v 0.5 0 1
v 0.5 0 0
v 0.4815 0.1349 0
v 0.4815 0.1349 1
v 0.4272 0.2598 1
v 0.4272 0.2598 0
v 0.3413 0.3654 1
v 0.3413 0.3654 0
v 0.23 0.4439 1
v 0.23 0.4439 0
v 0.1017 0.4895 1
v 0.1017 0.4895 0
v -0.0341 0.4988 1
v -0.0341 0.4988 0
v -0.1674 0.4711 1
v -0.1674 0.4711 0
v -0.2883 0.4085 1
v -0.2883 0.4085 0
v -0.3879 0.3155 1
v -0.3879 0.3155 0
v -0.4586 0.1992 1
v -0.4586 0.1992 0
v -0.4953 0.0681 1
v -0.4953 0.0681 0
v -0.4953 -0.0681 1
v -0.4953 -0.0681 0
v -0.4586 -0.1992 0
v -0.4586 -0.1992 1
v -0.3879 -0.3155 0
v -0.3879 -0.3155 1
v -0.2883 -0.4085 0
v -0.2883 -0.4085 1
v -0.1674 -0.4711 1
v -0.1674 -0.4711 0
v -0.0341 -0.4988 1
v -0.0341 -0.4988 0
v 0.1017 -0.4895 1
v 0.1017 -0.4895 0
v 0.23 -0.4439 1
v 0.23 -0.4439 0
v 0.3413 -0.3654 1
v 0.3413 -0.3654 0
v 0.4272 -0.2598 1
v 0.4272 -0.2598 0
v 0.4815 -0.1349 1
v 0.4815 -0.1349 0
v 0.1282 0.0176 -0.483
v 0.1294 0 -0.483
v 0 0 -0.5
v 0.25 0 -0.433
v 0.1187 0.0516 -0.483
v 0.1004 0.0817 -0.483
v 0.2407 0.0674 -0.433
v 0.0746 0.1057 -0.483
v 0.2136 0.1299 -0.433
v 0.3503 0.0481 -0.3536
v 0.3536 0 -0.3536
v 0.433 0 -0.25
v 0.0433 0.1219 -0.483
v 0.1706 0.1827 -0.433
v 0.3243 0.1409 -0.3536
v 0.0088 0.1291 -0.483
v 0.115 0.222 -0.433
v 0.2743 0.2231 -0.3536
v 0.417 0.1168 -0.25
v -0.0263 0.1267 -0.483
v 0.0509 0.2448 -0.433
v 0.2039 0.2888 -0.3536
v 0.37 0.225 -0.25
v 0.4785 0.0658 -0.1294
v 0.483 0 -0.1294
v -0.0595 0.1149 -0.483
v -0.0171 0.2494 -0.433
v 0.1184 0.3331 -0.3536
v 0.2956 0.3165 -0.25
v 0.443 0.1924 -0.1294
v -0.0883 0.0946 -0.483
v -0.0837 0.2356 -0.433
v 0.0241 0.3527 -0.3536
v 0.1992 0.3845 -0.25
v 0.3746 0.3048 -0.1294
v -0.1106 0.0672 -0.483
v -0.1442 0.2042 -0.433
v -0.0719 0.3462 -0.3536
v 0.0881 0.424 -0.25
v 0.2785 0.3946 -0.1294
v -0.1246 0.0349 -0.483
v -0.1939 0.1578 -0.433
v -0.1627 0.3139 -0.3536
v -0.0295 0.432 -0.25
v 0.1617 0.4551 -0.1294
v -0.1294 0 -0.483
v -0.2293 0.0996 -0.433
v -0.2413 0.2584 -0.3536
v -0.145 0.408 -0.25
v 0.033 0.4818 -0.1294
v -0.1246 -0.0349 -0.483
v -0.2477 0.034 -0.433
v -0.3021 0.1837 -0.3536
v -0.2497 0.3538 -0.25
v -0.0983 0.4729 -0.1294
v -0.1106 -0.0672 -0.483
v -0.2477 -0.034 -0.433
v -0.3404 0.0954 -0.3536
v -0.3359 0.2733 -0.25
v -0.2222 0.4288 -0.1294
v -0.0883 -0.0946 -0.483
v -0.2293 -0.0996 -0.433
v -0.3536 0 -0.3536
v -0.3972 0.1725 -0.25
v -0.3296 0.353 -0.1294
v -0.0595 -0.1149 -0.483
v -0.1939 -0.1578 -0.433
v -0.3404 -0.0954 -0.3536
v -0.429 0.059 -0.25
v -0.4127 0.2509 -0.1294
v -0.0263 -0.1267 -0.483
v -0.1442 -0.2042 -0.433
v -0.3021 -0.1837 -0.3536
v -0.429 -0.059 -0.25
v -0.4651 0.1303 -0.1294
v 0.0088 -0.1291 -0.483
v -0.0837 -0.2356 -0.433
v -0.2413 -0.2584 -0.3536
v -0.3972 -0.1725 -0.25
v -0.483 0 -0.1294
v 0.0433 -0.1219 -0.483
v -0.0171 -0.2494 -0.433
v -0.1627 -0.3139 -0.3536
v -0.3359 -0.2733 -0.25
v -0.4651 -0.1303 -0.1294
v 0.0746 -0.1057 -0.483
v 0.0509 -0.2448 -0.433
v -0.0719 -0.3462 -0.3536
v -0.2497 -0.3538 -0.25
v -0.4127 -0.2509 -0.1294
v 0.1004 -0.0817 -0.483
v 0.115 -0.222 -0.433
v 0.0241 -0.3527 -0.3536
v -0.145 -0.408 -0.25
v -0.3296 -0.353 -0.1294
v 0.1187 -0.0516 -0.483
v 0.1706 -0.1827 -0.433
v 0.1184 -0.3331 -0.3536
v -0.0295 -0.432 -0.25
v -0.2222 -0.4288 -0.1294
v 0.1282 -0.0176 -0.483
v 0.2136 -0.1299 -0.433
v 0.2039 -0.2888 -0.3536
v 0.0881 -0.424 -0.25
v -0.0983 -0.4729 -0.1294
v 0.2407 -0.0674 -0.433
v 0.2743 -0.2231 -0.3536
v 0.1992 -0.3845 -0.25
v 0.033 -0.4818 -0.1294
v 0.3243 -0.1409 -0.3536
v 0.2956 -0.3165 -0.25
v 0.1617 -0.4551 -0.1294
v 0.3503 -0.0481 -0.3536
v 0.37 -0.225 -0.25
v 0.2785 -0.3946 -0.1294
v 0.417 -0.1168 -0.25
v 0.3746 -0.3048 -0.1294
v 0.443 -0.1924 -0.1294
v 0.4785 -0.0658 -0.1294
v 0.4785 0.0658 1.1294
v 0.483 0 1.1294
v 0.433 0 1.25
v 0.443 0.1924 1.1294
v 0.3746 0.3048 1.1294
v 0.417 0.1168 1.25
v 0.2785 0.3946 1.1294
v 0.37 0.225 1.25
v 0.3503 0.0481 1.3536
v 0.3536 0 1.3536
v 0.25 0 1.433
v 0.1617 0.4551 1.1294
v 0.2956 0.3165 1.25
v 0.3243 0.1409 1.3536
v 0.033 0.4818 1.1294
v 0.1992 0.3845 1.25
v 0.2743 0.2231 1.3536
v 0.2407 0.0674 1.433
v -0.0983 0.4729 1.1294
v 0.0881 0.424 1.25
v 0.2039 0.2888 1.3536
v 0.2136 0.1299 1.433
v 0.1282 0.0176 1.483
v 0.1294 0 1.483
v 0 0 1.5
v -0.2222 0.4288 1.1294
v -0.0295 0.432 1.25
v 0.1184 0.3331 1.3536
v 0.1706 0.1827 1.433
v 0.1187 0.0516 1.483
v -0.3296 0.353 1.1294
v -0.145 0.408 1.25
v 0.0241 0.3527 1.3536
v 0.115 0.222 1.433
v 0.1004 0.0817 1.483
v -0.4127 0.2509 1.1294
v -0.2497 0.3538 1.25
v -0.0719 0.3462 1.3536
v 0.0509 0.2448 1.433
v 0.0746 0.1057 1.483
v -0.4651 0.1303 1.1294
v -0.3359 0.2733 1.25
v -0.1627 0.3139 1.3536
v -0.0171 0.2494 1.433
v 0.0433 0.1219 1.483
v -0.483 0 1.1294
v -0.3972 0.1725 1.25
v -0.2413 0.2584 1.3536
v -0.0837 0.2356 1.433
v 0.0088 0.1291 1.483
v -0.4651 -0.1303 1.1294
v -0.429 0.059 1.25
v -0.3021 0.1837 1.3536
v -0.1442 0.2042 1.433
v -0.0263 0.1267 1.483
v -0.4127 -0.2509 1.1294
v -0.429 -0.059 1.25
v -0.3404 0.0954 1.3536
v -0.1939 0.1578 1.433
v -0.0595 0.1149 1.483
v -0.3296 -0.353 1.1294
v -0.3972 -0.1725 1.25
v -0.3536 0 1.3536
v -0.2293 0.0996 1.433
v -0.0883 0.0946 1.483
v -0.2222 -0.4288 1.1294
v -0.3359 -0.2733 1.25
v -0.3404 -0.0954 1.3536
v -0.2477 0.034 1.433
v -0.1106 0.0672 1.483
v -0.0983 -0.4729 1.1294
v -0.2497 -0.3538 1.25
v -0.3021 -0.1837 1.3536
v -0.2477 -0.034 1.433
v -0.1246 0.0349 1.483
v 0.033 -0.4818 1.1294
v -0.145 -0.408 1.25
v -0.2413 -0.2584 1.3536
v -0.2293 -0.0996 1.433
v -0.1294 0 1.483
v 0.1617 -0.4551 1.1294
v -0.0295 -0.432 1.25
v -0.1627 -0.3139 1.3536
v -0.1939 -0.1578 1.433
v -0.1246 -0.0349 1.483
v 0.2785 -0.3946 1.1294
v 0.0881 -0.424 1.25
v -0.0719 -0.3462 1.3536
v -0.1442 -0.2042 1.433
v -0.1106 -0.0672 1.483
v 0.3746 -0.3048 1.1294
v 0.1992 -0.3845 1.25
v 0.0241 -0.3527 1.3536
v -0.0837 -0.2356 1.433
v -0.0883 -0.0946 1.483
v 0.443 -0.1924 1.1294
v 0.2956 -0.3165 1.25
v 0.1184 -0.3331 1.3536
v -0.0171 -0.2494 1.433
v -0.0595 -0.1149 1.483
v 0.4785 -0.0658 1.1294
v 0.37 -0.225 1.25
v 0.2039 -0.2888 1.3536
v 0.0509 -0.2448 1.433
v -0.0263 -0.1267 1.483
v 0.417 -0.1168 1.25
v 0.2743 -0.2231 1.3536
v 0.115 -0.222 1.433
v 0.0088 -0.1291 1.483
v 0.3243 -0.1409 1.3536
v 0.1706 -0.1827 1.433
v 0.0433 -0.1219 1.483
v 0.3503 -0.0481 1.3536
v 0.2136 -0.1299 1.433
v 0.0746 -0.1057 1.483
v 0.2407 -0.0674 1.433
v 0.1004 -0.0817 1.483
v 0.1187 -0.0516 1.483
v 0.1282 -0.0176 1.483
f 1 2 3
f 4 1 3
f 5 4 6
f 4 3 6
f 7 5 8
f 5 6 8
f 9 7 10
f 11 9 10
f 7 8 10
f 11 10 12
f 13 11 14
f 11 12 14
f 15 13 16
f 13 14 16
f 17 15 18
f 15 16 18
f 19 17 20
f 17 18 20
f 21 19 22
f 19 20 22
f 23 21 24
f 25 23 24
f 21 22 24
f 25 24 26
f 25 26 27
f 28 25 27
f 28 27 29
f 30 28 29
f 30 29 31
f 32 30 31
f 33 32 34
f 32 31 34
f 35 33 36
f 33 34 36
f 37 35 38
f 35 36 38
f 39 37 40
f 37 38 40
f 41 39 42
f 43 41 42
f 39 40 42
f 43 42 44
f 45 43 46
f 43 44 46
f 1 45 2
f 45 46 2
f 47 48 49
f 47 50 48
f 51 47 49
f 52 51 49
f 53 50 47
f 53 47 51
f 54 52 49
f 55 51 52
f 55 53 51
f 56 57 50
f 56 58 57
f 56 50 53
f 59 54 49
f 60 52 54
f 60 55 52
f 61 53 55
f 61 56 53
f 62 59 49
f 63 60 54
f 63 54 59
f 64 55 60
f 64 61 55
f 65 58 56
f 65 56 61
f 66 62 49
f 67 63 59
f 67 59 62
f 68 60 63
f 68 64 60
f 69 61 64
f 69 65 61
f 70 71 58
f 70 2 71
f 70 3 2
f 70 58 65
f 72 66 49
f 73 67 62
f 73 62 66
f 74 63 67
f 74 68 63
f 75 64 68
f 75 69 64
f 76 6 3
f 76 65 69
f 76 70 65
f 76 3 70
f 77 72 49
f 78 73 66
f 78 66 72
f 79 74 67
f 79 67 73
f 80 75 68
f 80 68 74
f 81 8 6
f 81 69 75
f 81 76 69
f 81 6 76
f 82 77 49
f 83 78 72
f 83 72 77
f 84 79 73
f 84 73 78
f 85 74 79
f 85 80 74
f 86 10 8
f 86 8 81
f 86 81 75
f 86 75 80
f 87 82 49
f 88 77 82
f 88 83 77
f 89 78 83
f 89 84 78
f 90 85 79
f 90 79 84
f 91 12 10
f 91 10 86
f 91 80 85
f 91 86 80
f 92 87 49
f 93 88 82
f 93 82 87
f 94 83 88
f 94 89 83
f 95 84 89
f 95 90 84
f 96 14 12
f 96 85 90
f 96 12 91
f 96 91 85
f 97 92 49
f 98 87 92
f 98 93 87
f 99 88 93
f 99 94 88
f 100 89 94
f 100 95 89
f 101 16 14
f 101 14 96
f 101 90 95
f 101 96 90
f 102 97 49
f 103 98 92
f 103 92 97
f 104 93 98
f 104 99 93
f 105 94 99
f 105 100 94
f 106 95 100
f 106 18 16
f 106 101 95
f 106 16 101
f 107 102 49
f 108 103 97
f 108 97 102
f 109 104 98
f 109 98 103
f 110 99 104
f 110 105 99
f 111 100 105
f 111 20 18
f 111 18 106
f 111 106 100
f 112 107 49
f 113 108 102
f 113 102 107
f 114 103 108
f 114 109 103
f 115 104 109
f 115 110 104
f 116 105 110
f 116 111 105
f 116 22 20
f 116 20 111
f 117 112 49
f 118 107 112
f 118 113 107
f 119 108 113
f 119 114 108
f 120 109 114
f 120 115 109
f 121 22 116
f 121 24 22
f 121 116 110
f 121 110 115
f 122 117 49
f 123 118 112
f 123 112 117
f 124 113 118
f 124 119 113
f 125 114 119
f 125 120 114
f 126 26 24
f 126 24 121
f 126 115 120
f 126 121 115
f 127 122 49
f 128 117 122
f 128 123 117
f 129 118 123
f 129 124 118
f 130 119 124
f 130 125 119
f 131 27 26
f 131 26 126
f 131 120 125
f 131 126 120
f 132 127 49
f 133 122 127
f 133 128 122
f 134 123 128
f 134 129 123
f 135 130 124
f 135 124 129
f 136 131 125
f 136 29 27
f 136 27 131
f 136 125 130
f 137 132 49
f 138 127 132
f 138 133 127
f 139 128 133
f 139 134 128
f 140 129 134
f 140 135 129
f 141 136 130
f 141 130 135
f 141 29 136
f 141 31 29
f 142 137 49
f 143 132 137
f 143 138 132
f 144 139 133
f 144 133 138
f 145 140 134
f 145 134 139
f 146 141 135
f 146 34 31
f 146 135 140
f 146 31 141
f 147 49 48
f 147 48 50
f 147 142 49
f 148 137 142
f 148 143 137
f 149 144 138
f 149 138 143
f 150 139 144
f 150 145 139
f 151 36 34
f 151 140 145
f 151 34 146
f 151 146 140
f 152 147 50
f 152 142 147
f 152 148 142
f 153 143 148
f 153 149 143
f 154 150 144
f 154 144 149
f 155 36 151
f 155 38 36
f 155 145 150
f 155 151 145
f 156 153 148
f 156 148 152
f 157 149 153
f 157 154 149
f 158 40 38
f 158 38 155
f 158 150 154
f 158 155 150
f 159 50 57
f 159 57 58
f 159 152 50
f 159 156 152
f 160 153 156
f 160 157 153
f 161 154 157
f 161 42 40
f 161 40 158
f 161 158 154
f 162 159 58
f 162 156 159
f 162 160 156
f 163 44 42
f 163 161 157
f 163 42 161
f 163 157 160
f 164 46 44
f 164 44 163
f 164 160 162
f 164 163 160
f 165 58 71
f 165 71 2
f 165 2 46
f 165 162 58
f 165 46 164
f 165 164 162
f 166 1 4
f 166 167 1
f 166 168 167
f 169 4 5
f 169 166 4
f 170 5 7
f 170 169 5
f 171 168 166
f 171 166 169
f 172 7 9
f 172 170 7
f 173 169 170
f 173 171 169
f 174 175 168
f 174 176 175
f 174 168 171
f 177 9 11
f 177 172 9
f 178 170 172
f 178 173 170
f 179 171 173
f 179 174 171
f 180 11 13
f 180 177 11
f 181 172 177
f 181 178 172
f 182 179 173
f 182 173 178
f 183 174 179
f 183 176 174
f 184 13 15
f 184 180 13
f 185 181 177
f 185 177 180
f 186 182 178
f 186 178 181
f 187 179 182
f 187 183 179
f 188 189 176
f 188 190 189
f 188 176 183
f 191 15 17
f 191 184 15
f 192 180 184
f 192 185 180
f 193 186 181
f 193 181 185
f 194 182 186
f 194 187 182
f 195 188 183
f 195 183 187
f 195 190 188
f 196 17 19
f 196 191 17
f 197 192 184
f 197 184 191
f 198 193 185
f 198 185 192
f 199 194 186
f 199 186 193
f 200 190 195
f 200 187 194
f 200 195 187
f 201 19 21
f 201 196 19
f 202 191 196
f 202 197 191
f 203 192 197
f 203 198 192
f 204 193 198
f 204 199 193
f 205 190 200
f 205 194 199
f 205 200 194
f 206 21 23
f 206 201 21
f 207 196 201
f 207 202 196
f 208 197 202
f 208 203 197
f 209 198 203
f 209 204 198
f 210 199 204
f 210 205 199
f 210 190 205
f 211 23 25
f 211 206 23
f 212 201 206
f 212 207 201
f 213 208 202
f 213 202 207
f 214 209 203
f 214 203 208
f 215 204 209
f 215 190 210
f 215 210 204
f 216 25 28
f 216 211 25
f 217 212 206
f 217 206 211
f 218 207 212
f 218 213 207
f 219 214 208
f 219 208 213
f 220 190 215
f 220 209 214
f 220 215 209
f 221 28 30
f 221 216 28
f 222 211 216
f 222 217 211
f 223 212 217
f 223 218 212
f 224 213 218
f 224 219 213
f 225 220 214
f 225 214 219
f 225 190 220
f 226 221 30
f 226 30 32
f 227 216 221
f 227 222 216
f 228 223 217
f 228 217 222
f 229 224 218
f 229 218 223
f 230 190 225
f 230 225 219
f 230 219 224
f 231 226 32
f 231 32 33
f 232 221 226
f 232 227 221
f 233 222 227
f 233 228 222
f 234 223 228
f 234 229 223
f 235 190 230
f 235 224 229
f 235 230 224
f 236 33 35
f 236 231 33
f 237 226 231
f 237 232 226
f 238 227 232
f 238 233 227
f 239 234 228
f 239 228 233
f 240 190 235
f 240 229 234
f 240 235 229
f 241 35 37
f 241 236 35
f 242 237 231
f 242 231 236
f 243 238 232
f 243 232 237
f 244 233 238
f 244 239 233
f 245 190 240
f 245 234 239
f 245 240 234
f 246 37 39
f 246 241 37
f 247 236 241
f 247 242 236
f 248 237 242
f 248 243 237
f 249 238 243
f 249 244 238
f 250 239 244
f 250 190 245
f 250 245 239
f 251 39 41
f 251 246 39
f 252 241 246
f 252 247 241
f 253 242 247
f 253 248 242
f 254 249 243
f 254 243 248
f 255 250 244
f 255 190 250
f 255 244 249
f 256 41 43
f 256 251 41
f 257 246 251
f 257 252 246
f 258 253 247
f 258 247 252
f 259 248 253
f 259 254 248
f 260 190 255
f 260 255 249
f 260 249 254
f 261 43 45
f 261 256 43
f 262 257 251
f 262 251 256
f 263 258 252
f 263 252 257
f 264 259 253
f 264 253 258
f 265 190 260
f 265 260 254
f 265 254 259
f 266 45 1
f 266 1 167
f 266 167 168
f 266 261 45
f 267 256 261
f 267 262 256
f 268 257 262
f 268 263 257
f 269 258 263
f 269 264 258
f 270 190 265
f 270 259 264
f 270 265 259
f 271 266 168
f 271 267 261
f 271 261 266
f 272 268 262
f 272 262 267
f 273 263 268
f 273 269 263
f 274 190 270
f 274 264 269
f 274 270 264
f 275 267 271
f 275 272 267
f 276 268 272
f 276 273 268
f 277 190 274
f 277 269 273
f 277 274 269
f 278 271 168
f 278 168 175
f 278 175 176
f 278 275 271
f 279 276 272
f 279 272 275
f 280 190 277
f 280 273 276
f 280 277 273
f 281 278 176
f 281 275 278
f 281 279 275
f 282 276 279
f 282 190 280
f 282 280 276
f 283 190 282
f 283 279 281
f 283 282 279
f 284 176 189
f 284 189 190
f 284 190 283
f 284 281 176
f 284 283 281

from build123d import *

# Parameters (mm, degrees)
CYLINDER003_R     = 0.5
CYLINDER003_DEPTH = 1


with BuildPart() as cylinder003:
    # Cylinder003 → Cylinder003 (new body)
    with BuildSketch(Plane.XY):
        Circle(CYLINDER003_R)
    extrude(amount=CYLINDER003_DEPTH)


with BuildPart() as fusion:
    # Sphere → Sphere (revolve)
    with BuildSketch(Plane.XZ):
        with BuildLine():
            ThreePointArc((0, -0.5), (0.5, 0), (0, 0.5))
            Line((0, 0.5), (0, -0.5))
        make_face()
    revolve(axis=Axis((0, 0, 0), (0, 0, 1)))

    # Fusion: union Cylinder003
    add(cylinder003.part)


with BuildPart() as capsule:
    # Sphere001 → Sphere001 (revolve)
    with BuildSketch(Plane(origin=(0, 0, 1), x_dir=(1, 0, 0), z_dir=(0, -1, 0))):
        with BuildLine():
            ThreePointArc((0, -0.5), (0.5, 0), (0, 0.5))
            Line((0, 0.5), (0, -0.5))
        make_face()
    revolve(axis=Axis((0, 0, 1), (0, 0, 1)))

    # Fusion001: union Fusion
    add(fusion.part)


solid = capsule.part
